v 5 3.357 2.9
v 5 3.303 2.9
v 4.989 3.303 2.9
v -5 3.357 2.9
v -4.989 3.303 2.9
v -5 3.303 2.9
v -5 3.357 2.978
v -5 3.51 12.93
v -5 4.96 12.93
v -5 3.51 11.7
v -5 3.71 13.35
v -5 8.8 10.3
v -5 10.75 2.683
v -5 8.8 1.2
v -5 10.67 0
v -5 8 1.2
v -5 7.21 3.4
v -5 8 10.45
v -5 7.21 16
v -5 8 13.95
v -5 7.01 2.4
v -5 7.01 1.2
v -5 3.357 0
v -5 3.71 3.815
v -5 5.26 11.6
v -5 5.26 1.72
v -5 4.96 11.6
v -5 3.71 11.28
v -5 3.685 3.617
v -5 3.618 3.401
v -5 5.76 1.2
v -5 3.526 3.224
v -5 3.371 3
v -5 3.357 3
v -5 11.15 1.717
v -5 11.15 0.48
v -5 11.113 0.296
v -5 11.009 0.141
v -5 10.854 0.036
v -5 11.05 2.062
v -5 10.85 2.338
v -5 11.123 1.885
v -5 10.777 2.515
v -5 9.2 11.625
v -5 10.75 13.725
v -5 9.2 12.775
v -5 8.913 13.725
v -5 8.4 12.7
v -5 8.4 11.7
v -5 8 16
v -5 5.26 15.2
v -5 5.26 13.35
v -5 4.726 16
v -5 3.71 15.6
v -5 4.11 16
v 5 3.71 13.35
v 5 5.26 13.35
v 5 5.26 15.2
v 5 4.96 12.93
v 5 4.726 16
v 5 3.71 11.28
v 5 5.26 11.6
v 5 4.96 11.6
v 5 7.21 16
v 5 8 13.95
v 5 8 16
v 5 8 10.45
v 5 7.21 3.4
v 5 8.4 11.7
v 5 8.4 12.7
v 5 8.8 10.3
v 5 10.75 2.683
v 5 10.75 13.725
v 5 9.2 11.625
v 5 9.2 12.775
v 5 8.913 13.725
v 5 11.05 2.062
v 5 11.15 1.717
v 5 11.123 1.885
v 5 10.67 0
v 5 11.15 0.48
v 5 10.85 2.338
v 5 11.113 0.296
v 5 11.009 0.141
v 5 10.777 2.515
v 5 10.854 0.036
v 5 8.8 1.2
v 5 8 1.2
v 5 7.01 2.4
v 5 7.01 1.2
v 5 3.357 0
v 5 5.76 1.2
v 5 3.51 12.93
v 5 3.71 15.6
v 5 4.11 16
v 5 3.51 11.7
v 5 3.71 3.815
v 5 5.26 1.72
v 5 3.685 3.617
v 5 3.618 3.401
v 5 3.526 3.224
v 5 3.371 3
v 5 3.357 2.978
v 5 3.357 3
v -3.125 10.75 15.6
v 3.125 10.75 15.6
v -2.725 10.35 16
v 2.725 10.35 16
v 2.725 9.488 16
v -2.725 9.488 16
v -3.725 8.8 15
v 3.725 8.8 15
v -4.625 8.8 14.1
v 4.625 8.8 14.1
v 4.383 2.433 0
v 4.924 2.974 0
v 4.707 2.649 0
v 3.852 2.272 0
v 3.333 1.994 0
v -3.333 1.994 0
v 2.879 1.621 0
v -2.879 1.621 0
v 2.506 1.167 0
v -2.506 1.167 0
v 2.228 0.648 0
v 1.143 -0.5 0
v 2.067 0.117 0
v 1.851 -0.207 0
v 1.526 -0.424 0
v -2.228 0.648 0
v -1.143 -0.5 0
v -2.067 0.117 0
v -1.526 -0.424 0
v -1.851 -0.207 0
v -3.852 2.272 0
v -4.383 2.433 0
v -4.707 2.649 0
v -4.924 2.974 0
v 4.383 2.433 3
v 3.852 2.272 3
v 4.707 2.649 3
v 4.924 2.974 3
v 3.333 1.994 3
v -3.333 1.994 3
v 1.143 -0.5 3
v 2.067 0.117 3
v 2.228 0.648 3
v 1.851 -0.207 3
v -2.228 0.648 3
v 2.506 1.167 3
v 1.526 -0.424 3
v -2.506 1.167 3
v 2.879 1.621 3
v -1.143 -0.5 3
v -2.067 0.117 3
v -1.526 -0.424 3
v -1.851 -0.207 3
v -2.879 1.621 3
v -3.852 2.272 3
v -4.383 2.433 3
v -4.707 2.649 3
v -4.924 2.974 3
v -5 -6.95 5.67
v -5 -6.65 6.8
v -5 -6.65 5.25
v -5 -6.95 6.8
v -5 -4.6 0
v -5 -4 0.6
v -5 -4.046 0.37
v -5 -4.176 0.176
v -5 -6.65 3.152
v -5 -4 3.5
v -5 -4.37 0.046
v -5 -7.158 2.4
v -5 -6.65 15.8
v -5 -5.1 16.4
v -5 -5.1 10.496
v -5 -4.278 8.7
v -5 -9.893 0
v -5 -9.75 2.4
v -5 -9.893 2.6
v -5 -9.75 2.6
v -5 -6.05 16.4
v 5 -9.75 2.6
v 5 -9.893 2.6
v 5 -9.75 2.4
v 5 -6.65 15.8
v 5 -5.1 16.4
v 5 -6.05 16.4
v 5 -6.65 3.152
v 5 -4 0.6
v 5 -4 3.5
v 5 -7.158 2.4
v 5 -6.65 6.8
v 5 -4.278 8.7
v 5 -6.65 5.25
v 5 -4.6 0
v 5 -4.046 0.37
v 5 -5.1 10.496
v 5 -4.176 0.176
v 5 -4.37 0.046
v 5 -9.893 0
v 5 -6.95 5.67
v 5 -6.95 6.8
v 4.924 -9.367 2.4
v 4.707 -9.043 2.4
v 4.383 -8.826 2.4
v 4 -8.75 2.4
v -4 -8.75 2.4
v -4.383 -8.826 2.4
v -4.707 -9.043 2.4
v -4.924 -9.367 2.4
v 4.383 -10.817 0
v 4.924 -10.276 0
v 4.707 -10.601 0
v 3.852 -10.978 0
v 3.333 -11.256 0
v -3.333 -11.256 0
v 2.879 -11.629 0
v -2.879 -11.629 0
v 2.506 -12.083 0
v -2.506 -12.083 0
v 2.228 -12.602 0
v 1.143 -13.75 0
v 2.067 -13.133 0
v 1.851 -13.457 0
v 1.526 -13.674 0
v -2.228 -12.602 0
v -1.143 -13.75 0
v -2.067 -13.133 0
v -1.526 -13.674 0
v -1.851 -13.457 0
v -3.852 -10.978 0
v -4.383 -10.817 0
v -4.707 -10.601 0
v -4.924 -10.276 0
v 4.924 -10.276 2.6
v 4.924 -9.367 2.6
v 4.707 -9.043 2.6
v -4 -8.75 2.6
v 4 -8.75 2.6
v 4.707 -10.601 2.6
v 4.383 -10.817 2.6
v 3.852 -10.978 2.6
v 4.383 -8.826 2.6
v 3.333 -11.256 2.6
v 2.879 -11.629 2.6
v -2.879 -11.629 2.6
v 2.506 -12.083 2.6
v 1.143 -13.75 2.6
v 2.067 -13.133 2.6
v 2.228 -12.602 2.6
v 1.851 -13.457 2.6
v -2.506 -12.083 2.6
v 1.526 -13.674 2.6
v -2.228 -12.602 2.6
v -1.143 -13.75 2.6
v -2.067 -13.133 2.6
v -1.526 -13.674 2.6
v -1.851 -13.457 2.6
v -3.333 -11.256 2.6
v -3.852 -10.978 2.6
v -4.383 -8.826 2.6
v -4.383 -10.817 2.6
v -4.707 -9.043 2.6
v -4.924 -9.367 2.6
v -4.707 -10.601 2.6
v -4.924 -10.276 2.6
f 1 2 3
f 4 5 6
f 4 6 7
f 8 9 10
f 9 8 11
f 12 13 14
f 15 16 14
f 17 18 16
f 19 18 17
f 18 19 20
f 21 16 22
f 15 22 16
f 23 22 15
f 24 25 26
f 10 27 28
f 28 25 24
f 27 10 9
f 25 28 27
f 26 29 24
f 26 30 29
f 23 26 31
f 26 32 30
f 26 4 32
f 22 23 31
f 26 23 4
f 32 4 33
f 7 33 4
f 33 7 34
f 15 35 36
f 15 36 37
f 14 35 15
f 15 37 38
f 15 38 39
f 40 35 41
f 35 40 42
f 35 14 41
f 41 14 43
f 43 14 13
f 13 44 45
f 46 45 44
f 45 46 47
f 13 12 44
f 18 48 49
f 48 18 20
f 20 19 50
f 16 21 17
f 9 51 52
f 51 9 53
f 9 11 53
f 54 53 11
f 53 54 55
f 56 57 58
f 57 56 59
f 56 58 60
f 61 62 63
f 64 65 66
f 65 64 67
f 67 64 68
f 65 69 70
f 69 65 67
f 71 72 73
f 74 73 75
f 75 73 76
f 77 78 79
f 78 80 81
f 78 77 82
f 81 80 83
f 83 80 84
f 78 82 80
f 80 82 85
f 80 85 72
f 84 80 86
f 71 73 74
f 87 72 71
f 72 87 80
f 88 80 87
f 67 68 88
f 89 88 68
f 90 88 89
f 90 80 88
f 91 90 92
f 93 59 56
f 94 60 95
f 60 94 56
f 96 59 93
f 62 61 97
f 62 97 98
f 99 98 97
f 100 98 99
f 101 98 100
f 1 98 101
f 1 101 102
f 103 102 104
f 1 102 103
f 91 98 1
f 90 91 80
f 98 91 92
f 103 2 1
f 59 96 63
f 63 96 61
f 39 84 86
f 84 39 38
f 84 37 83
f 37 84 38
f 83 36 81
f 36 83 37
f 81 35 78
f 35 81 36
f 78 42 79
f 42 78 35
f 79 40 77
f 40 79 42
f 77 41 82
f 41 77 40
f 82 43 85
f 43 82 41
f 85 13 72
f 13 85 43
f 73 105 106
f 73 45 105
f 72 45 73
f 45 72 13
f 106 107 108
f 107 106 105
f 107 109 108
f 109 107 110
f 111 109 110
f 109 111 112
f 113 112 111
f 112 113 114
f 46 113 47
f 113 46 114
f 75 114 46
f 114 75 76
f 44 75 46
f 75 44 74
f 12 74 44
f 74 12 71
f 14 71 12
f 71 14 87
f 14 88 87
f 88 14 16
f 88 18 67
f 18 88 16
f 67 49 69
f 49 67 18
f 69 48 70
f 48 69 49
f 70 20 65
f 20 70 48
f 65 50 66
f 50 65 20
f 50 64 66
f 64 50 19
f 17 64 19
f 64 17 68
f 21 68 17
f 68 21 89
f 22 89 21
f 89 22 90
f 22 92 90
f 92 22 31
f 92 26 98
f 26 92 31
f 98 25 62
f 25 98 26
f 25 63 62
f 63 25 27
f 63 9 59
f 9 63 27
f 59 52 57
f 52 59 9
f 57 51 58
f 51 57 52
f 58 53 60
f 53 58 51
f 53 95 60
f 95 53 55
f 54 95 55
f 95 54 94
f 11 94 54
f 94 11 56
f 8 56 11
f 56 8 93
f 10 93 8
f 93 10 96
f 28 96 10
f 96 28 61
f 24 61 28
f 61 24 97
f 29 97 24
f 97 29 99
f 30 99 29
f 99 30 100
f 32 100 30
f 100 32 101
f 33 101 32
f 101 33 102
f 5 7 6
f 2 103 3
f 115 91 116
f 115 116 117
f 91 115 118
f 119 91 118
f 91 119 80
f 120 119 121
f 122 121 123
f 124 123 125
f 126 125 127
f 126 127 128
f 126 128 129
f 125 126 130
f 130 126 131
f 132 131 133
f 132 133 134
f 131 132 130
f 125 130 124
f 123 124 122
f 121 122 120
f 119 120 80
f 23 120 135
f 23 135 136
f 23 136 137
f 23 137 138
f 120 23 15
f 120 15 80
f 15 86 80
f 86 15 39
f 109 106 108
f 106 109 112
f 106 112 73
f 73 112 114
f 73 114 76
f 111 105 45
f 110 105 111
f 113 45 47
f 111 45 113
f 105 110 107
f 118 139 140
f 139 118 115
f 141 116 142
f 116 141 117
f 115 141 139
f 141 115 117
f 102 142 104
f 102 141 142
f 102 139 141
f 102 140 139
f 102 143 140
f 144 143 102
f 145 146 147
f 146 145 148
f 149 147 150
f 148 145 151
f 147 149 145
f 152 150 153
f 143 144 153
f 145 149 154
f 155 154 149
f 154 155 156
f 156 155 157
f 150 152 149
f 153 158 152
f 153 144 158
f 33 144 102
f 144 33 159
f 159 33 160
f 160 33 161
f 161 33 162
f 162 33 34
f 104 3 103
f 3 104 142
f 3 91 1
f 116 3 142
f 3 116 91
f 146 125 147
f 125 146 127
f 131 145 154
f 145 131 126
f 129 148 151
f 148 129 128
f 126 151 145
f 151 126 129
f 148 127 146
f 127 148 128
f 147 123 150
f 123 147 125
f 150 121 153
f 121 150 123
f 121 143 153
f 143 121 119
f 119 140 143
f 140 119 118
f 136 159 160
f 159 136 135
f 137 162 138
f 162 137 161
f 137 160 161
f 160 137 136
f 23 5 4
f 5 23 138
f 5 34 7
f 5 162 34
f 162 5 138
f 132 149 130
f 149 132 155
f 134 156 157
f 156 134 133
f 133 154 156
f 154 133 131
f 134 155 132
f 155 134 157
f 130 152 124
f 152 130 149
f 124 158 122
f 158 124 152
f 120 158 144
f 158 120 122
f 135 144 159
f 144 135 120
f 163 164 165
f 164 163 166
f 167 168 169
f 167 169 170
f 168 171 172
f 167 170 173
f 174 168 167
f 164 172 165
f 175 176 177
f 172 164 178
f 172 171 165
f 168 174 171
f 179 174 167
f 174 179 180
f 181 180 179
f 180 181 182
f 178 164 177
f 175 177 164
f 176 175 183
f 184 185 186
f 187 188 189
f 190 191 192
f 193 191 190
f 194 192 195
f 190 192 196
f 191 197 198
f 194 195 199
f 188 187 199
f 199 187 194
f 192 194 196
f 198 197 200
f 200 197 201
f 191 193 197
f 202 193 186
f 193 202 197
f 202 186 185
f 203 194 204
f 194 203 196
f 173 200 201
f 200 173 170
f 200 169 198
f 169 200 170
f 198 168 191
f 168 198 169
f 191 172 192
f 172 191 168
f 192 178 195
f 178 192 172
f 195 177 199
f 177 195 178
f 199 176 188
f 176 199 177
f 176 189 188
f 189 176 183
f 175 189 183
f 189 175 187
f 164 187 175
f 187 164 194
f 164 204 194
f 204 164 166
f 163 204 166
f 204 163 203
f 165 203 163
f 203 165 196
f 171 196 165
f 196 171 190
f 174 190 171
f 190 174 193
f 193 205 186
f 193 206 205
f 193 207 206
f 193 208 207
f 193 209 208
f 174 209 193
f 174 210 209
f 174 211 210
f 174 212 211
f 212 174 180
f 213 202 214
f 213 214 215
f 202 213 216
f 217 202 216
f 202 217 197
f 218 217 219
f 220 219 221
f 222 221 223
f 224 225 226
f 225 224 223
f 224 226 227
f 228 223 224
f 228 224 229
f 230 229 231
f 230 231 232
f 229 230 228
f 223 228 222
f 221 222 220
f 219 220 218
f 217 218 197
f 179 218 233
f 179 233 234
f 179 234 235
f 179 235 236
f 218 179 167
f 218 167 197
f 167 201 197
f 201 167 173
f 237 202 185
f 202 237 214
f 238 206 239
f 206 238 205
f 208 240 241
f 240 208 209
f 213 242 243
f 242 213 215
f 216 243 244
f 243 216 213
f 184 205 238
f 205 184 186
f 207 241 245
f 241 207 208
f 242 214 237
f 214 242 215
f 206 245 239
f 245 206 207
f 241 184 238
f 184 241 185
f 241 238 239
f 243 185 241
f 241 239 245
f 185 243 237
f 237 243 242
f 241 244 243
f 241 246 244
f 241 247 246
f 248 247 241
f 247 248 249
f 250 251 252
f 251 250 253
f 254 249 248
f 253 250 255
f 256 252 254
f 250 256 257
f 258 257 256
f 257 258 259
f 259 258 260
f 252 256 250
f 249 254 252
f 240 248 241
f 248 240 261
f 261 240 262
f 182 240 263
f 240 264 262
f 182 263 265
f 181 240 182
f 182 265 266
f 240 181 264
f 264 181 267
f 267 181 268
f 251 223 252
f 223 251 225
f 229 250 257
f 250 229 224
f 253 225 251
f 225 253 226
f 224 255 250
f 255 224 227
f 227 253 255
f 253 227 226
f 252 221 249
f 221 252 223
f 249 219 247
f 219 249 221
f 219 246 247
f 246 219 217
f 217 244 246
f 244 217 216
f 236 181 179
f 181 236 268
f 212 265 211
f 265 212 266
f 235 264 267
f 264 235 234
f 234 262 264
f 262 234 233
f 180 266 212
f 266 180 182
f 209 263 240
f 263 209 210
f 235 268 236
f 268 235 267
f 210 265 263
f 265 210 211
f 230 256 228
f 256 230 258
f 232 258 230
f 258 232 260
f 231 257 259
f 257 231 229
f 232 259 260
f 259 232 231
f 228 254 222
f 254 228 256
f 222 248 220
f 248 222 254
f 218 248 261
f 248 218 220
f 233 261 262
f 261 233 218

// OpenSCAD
// Bag sealer v3 by DrLex, 2017/10- 2018/11
// Released under Creative Commons - Attribution license

// Length of the clip in millimeters
length = 10;

// Width of the open gap. The gap will become about 0.75mm narrower with the insert in place. A good value is the thickness of the folded bag plus 0.5mm.
gap = 0.8; //[.1:.05:3]

// Generate extra 'nubs' that make it easier to push the parts out of each other?
nubs = "yes"; //[yes,no]

// Enable this to create a stronger model (requires more material to print).
heavy_duty = "no"; //[yes,no]

// Generate what parts?
generate = "both"; //[both,clip,insert]

/* [Hidden] */
doNubs = nubs == "yes" ? true : false;
saveMaterial = heavy_duty == "yes" ? false : true;
shiftXtra = doNubs ? 1 : 0;
shiftClip = generate == "both" ? 7 + shiftXtra : 0;
shiftInsert = generate == "both" ? -(3 + shiftXtra) : 4;

if(generate == "both" || generate == "clip") {
    translate([0, shiftClip, 0]) {
        difference() {
            rotate([90, 0, 90]) linear_extrude(length, center=true, convexity=6) clipPoly(gap);
            translate([length/2+.1, 1.7+gap, 16.1]) rotate([0,45,0]) cube(3.5, center=true);
            translate([-length/2-.1, 1.7+gap, 16.1]) rotate([0,45,0]) cube(3.5, center=true);

            if(doNubs) {
                translate([length/2-1, -6.5, -.5]) cube([2, 2, 3.4]);
                translate([-length/2-1, -6.5, -.5]) cube([2, 2, 3.4]);
            }
        }
        if(doNubs) {
            translate([length/2, 0, 0]) nub(3);
            translate([-length/2, 0, 0]) mirror([1, 0, 0]) nub(3);
        }
    }
}
if(generate == "both" || generate == "insert") {
    translate([0, shiftInsert, 0]) {
        difference() {
            rotate([90, 0, 90]) linear_extrude(length, center=true, convexity=6) insertPoly();

            if(doNubs) {
                translate([length/2-3, -10, -.5]) cube([6, 4.12, 3.4]);
                translate([-length/2-3, -10, -.5]) cube([6, 4.12, 3.4]);
            }

            if(saveMaterial && length > 25) {
                translate([0, -9.5, -1]) {
                    hull() {
                        translate([-length/2 + 13, 0, 0]) cylinder(r=5, h=10, $fn=48);
                        translate([length/2 - 13, 0, 0]) cylinder(r=5, h=10, $fn=48);
                        translate([-length/2 + 7.7, .2, 0]) cube([1,1,10], h=10, center=true);
                        translate([length/2 - 7.7, .2, 0]) cube([1,1,10], h=10, center=true);
                    }
                }
            }
        }
        if(doNubs) {
            translate([length/2, -1.25, 0]) nub(2.6);
            translate([-length/2, -1.25, 0]) mirror([1, 0, 0]) nub(2.6);
        }
    }
}

module nub(h) {
    minkowski() {
        difference() {
            translate([-6, -7.5, 0]) cube([5, 3, h-1]);
            translate([0, -8.5, -.5]) cylinder(r=4, h=4, $fn=32);            
        }
        cylinder(r=1, h=1, $fn=16);
    }
}

module clipPoly(ox) {
    polygon(convexity=6, points=[
    [0.0, 1.2],
    [0.0, 10.45],
    [0.4, 11.7],
    [0.4, 12.7],
    [0.0, 13.95],
    [0.0, 16.0],
    [-0.79, 16.0],
    [-0.79, 3.4],
    [-0.99, 2.4],
    [-0.99, 1.2],
    [-2.24, 1.2],
    [-2.74, 1.72],
    [-2.74, 11.6],
    [-3.04, 11.6],
    [-3.04, 12.9299],
    [-2.74, 13.35],
    [-2.74, 15.2],
    [-3.2737, 16.0],
    [-3.89, 16.0],
    [-4.29, 15.6],
    [-4.29, 13.35],
    [-4.49, 12.9299],
    [-4.49, 11.7],
    [-4.29, 11.2799],
    [-4.29, 3.8146],
    [-4.3146, 3.6169],
    [-4.382, 3.4007],
    [-4.474, 3.224],
    [-5.106, 2.3078],
    [-5.198, 2.1311],
    [-5.2654, 1.9149],
    [-5.29, 1.7172],
    [-5.29, 0.48],
    [-5.2535, 0.2963],
    [-5.1494, 0.1406],
    [-4.9937, 0.0365],
    [-4.81, 0.0],

    [1.87+ox, 0.0],
    [2.0537+ox, 0.0365],
    [2.2094+ox, 0.1406],
    [2.3135+ox, 0.2963],
    [2.35+ox, 0.48],
    [2.35+ox, 1.7172],
    [2.3232+ox, 1.8854],
    [2.25+ox, 2.0621],
    [2.15+ox, 2.2],
    [2.05+ox, 2.3379],
    [1.9768+ox, 2.5146],
    [1.95+ox, 2.6828],
    [1.95+ox, 15.6],
    [1.55+ox, 16.0],
    [0.6883+ox, 16.0],
    [ox, 15.0],
    [ox, 14.1],
    [0.4+ox, 12.775],
    [0.4+ox, 11.625],
    [ox, 10.3],
    [ox, 1.2]
    ]);
}

module insertPoly() {
    polygon(convexity=4, points=[
        [0.0, 0.6],
        [0.0, 3.5],
        [-0.2783, 8.7],
        [-1.1, 10.496],
        [-1.1, 16.4],
        [-2.05, 16.4],
        [-2.65, 15.8],
        [-2.65, 6.8],
        [-2.95, 6.8],
        [-2.95, 5.67],
        [-2.65, 5.25],
        [-2.65, 3.1523],
        [-3.1583, 2.4],
        [-8.15, 2.4],
        [-8.3796, 2.3543],
        [-8.5743, 2.2243],
        [-8.7043, 2.0296],
        [-8.75, 1.8],
        [-8.75, 0.6],
        [-8.7043, 0.3704],
        [-8.5743, 0.1757],
        [-8.3796, 0.0457],
        [-8.15, 0.0],
        [-0.6, 0.0],
        [-0.3704, 0.0457],
        [-0.1757, 0.1757],
        [-0.0457, 0.3704]
    ]);
}
